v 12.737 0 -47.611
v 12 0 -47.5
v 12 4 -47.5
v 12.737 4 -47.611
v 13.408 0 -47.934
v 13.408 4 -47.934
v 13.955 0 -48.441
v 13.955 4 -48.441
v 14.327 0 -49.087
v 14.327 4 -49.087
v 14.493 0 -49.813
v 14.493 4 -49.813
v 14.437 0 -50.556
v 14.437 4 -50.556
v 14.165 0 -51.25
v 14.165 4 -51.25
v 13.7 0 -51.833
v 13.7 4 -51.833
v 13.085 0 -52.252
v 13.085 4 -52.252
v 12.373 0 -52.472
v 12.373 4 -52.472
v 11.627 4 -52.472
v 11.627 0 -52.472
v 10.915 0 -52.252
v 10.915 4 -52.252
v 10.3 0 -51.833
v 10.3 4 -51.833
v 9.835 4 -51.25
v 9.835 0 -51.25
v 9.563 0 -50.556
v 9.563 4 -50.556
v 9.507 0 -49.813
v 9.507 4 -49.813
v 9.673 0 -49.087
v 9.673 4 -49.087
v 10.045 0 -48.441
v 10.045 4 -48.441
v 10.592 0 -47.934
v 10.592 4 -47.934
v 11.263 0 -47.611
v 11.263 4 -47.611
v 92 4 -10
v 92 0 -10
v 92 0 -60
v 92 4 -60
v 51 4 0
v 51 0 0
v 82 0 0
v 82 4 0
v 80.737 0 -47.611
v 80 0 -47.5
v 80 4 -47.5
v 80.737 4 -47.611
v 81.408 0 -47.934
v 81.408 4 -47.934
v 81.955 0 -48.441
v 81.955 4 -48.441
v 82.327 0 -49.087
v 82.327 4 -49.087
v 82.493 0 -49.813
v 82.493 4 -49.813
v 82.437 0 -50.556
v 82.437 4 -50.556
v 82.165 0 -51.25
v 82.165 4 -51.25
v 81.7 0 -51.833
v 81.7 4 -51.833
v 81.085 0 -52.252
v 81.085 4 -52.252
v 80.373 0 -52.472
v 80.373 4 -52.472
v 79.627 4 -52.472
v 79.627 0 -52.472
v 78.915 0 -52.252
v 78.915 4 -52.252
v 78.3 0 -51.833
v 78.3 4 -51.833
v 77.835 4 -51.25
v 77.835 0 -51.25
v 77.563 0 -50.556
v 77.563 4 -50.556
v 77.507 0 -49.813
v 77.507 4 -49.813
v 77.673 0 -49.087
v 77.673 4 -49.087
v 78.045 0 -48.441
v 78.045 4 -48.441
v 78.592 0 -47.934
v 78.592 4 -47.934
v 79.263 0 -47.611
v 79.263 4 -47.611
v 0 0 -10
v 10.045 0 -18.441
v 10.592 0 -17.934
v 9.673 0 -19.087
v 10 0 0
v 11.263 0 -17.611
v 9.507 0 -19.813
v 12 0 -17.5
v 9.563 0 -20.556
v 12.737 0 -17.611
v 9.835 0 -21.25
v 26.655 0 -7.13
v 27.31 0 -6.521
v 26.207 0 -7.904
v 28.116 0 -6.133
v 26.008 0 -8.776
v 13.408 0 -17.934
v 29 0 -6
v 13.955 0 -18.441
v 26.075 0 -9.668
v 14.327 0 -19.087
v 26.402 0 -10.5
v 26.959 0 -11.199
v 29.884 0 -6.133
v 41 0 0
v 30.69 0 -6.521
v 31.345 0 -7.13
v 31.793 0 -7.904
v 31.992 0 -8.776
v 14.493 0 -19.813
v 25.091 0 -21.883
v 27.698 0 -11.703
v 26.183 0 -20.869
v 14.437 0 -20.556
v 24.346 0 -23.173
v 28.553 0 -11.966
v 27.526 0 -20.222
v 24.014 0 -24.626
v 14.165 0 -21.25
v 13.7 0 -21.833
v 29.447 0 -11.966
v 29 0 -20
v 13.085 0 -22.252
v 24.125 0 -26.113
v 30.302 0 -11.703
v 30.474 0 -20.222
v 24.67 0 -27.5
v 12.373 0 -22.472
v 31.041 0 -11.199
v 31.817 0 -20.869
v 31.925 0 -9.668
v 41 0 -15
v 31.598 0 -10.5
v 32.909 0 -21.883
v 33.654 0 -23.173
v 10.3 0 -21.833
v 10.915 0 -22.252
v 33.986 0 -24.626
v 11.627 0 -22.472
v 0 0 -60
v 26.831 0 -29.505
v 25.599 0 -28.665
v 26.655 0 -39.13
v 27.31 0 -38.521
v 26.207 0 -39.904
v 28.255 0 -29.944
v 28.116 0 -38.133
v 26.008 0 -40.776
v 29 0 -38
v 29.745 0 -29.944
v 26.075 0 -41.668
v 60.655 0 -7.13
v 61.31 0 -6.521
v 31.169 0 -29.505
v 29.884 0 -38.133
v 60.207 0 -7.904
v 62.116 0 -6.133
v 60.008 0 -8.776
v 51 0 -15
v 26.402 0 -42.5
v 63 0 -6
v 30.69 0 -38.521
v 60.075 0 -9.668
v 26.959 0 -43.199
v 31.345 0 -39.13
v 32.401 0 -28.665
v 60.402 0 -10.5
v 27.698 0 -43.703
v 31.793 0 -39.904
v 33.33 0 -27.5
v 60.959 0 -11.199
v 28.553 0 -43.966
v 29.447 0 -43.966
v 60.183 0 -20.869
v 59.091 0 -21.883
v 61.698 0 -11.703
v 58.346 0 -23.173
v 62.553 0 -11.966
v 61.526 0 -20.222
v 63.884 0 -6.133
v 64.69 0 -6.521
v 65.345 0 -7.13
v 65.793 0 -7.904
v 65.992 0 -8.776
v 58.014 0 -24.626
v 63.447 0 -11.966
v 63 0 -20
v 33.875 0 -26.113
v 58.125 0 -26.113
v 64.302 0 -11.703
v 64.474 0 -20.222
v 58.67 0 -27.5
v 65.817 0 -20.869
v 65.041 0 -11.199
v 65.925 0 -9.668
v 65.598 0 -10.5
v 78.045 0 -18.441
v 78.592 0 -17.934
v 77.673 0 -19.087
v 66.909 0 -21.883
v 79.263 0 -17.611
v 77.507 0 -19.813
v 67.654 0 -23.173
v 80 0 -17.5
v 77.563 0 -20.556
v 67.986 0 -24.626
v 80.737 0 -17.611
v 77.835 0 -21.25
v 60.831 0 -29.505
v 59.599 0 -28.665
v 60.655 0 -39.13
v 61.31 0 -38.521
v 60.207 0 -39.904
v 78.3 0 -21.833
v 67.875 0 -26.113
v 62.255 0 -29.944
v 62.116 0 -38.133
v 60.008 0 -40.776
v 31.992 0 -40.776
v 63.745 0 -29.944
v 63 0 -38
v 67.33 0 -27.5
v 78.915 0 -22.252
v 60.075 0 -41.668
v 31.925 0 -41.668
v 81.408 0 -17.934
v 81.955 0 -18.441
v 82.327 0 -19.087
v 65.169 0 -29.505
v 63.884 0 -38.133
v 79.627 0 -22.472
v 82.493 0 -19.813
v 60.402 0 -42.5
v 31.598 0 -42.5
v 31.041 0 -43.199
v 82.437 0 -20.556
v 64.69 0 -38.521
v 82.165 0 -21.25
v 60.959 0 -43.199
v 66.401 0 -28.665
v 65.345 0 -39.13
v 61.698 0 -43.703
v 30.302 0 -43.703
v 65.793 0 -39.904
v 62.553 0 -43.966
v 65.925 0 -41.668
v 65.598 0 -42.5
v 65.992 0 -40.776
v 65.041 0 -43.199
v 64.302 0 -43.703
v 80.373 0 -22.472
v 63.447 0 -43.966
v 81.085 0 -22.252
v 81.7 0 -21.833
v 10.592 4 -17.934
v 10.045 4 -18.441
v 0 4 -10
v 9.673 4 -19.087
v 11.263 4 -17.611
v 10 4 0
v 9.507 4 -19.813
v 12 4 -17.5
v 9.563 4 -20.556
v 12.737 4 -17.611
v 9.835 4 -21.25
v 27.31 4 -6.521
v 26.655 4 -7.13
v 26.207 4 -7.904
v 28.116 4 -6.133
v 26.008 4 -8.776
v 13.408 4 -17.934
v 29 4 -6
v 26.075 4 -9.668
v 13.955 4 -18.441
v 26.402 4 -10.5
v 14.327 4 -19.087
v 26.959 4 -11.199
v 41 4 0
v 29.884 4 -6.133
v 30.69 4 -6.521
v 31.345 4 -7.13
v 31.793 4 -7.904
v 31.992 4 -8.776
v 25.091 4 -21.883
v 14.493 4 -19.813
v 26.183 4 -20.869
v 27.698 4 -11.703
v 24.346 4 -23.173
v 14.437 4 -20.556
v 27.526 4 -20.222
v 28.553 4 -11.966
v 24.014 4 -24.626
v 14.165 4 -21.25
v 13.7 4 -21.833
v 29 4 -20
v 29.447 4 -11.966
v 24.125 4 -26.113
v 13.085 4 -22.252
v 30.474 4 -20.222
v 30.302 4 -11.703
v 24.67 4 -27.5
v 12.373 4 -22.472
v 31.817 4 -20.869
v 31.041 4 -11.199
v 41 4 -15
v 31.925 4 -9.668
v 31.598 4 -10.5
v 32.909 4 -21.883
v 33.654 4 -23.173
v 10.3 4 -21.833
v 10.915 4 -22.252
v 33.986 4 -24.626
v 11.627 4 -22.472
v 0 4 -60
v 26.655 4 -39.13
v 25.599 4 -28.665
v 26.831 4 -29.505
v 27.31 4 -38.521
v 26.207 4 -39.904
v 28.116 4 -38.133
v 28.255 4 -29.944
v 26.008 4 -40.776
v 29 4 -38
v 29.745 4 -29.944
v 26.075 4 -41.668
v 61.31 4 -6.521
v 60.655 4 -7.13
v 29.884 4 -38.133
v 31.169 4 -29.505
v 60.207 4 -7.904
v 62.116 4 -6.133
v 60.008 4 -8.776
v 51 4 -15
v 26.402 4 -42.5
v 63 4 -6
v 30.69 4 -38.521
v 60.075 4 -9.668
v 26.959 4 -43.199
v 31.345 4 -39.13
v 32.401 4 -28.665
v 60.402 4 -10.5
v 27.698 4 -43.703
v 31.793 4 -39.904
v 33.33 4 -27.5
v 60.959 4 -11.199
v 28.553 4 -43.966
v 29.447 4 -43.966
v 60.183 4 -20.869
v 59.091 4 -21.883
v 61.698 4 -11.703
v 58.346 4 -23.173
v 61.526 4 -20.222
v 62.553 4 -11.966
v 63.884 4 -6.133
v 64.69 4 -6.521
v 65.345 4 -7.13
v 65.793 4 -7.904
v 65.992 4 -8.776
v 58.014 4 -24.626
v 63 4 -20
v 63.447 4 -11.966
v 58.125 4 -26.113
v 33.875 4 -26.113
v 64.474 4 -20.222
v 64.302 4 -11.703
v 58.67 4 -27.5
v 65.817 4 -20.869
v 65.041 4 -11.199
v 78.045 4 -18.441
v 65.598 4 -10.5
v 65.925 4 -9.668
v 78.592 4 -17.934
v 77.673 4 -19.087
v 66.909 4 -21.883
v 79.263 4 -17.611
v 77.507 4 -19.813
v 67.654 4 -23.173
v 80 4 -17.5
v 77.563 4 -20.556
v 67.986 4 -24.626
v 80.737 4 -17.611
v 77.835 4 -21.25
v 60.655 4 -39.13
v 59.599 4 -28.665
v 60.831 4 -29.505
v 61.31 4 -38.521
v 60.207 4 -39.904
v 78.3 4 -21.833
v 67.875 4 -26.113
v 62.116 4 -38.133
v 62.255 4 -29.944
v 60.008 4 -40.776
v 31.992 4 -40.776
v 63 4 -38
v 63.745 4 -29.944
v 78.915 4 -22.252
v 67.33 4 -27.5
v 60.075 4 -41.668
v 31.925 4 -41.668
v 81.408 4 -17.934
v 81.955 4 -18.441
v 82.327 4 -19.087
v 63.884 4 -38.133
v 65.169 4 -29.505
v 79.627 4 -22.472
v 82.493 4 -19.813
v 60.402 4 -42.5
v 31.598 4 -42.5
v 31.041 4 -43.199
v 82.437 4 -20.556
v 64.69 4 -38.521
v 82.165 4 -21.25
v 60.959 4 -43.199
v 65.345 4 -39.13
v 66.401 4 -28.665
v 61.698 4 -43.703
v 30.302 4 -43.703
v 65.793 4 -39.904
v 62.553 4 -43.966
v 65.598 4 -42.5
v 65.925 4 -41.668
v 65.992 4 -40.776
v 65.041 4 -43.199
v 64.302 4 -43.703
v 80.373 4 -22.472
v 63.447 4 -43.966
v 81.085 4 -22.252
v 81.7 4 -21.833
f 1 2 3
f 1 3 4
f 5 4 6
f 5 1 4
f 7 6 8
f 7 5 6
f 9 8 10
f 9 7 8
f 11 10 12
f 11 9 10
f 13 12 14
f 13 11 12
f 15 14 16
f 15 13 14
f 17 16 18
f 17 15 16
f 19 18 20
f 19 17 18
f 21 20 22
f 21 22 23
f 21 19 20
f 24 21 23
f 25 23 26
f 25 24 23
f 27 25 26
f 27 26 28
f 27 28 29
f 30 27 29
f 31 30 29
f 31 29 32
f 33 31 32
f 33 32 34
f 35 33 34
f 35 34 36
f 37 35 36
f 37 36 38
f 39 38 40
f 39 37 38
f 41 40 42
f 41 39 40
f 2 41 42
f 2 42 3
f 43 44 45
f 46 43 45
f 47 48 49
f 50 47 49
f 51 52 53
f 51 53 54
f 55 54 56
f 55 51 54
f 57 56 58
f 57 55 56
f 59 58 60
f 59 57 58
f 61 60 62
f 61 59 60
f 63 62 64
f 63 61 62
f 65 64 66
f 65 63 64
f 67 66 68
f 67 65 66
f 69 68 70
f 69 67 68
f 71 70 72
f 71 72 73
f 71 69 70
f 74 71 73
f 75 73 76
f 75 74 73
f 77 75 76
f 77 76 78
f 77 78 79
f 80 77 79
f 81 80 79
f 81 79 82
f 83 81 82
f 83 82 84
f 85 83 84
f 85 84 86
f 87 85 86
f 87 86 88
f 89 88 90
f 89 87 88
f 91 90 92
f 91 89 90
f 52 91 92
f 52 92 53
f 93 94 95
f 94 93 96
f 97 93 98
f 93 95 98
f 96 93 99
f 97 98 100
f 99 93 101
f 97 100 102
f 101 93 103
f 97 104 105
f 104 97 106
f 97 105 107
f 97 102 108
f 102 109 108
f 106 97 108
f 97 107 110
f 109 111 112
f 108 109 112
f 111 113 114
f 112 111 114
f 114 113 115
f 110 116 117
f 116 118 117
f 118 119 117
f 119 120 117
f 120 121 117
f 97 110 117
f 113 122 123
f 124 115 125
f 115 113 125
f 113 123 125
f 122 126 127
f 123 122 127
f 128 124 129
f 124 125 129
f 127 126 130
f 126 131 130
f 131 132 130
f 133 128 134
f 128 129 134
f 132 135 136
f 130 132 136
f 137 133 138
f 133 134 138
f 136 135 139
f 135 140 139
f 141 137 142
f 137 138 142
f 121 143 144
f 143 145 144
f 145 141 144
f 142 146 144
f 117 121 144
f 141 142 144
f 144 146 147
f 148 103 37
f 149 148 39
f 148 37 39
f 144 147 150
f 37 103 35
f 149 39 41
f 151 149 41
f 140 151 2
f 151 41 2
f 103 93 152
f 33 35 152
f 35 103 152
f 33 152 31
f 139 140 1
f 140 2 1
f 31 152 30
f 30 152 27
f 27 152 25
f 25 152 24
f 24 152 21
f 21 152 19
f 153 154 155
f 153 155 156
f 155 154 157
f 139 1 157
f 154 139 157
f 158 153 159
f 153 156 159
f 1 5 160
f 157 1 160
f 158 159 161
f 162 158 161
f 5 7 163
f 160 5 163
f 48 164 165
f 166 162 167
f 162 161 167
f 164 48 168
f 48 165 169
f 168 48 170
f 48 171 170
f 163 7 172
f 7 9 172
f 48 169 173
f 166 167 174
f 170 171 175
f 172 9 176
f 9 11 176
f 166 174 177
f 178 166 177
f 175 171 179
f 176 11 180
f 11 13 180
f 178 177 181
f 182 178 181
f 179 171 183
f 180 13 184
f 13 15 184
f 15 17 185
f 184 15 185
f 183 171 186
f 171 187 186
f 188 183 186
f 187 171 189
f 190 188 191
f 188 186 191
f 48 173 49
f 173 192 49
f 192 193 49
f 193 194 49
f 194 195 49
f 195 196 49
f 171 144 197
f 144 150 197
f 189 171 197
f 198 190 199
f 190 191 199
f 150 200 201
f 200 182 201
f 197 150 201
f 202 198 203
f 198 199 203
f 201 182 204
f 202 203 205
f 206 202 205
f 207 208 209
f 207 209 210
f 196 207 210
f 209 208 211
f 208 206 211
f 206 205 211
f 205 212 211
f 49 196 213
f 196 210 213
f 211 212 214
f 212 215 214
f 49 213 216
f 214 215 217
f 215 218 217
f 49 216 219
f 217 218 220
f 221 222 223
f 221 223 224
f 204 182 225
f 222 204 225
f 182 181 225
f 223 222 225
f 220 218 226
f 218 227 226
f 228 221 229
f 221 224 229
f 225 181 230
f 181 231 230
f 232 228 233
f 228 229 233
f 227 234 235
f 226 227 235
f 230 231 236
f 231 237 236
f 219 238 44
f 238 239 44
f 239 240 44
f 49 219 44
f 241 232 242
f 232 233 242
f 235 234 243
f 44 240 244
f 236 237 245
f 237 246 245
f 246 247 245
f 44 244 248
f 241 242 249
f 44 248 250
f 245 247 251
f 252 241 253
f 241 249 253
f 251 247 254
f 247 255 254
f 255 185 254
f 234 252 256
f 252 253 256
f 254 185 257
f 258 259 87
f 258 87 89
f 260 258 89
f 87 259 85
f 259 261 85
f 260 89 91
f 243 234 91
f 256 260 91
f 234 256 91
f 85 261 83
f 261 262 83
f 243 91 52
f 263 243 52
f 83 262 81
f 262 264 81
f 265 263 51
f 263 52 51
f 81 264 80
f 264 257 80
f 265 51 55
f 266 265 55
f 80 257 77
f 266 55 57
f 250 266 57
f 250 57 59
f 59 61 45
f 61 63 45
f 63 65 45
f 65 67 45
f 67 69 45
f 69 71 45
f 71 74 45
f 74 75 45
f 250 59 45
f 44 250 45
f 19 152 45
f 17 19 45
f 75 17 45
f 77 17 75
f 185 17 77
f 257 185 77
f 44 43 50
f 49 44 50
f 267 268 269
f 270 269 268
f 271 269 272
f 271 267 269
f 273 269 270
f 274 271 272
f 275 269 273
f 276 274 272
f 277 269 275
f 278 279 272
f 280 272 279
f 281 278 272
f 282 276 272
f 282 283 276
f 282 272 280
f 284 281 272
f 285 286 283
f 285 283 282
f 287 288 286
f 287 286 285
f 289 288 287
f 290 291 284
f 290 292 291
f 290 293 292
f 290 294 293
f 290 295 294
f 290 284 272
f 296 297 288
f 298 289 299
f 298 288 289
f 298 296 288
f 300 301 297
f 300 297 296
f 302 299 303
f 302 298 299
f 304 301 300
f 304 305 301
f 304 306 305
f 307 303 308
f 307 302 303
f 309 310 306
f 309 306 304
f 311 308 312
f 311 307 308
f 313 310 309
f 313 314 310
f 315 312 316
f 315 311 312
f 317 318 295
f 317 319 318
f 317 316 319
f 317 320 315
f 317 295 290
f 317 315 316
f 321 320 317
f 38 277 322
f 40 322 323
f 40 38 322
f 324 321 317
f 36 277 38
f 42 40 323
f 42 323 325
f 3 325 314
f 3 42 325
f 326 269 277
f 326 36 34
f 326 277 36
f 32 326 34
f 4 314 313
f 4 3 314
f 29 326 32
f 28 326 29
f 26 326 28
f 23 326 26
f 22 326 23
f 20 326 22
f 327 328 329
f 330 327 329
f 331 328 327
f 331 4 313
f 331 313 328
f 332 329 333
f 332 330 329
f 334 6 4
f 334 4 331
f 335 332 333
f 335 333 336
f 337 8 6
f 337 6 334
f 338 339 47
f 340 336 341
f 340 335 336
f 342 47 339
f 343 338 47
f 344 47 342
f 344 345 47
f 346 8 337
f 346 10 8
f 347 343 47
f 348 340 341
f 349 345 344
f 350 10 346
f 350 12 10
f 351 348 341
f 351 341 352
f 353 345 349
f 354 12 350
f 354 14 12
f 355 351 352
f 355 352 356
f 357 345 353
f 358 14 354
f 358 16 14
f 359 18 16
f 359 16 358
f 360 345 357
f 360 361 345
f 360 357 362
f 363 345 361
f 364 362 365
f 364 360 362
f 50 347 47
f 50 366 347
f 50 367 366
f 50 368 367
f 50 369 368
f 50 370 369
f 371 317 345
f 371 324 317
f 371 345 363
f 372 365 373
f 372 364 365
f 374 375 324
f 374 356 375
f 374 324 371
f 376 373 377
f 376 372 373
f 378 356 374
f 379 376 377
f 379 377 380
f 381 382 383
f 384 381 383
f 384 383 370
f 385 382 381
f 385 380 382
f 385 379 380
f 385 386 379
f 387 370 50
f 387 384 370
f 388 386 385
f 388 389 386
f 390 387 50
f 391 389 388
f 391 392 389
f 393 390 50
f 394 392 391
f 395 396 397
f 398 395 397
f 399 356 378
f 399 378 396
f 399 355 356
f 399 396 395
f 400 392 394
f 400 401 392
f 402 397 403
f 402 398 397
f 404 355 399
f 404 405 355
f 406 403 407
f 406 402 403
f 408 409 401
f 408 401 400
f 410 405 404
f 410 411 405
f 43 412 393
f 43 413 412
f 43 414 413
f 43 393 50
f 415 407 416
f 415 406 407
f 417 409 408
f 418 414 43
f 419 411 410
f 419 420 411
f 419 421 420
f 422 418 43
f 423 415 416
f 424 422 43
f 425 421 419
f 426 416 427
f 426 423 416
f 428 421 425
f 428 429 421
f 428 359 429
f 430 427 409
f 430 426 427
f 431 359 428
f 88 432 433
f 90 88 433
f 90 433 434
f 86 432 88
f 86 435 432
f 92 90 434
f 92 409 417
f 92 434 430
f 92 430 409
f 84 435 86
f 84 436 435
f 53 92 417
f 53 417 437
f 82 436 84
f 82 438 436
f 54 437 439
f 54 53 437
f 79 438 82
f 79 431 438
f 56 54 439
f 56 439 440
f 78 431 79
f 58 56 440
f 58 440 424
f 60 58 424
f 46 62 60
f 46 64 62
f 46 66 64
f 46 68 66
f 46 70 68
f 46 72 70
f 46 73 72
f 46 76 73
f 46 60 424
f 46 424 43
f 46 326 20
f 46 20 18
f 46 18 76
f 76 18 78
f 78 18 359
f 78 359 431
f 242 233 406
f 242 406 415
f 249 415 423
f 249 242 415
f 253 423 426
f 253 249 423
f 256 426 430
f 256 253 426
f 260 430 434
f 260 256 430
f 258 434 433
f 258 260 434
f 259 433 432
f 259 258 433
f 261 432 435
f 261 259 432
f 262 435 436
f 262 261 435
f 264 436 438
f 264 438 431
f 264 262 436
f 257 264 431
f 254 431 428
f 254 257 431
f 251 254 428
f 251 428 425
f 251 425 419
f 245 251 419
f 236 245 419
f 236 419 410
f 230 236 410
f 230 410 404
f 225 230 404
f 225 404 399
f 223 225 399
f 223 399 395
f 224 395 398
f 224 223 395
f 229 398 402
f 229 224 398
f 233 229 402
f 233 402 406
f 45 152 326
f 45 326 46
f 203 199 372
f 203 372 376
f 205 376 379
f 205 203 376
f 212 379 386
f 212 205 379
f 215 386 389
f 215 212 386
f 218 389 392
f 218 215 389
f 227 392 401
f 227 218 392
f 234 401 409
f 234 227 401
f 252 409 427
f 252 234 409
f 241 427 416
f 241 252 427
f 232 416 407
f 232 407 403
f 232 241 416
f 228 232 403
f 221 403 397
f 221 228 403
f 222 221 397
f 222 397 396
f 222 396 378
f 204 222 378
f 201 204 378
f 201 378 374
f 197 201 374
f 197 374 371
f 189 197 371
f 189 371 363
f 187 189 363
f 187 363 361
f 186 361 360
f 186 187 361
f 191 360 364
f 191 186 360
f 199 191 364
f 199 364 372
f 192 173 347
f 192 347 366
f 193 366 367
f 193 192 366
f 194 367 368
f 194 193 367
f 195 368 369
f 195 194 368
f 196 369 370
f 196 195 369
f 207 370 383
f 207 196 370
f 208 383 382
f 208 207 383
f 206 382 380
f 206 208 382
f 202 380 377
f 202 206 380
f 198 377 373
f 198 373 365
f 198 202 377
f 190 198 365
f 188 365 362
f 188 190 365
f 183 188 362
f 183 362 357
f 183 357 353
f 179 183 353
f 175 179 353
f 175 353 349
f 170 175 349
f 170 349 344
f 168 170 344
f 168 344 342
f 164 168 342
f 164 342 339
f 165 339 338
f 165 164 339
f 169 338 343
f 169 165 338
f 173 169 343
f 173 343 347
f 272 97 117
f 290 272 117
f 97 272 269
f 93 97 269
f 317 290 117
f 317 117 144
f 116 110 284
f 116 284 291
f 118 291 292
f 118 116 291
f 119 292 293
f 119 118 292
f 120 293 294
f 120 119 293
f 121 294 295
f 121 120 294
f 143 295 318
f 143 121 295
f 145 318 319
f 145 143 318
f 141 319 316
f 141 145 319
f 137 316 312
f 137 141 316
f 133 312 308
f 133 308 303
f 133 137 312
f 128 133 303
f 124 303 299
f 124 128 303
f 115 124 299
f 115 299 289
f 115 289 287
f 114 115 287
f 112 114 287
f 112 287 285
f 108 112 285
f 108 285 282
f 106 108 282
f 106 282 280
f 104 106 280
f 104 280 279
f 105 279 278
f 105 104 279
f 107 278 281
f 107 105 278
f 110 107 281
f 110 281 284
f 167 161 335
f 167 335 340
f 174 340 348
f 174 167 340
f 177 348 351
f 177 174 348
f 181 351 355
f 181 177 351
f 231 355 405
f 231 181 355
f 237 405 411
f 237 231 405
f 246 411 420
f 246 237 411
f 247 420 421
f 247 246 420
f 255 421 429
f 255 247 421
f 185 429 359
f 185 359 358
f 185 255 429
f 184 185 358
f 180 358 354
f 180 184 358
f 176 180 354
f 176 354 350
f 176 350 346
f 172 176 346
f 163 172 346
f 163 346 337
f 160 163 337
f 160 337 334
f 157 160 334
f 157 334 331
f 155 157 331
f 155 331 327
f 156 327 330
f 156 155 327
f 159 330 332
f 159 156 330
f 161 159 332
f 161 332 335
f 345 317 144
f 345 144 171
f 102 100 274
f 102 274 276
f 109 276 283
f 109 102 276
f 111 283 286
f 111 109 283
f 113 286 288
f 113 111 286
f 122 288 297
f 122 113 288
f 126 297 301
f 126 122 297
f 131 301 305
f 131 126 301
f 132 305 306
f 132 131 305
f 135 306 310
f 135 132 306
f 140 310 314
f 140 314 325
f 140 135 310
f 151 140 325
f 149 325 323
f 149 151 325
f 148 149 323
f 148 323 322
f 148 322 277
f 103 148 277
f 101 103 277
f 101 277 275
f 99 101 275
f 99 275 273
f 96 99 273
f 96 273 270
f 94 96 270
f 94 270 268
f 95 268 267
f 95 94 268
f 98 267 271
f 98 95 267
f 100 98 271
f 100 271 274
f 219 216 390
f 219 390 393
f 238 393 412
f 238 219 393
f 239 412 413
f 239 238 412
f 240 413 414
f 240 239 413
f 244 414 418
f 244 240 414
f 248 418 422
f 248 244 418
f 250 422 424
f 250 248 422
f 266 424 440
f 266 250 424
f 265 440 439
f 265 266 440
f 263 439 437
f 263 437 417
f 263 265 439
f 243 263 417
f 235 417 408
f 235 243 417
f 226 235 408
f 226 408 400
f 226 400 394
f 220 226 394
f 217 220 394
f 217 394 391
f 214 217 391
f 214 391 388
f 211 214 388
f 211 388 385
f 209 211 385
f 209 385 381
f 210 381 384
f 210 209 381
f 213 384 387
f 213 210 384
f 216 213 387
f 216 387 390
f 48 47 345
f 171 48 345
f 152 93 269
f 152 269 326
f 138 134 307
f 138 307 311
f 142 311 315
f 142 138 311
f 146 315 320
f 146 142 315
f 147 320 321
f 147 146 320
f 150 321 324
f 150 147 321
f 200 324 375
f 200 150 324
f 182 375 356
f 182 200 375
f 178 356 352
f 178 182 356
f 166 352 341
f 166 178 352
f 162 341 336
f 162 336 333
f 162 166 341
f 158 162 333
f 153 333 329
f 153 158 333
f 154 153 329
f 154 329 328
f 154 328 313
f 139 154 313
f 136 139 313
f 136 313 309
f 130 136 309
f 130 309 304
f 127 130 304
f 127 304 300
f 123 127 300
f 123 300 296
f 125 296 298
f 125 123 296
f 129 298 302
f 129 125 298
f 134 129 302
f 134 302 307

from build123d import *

# Parameters (mm, degrees)
SKETCH_1_W          = 92
SKETCH_1_H          = 60
SKETCH_1_R          = 2.5
SKETCH_1_R_2        = 5
SKETCH_1_R_3        = 3
EXTRUDE_1_DEPTH     = 4
SKETCH_2_W          = 10
SKETCH_2_H          = 15
CUT_EXTRUDE_1_DEPTH = 10
CUT_EXTRUDE_2_DEPTH = 4


with BuildPart() as part:
    # Эскиз1 → Бобышка-Вытянуть1 (new body)
    with BuildSketch(Plane(origin=(0, 0, 0), x_dir=(1, 0, 0), z_dir=(0, 1, 0))):
        with Locations((46, 30)):
            Rectangle(SKETCH_1_W, SKETCH_1_H)
        with Locations(Location((12, 50, 0), (0, 0, 270))):
            Circle(SKETCH_1_R, mode=Mode.SUBTRACT)
        with Locations(Location((12, 20, 0), (0, 0, 270))):
            Circle(SKETCH_1_R, mode=Mode.SUBTRACT)
        with Locations(Location((80, 50, 0), (0, 0, 270))):
            Circle(SKETCH_1_R, mode=Mode.SUBTRACT)
        with Locations(Location((80, 20, 0), (0, 0, 270))):
            Circle(SKETCH_1_R, mode=Mode.SUBTRACT)
        with Locations(Location((29, 25, 0), (0, 0, 270))):
            Circle(SKETCH_1_R_2, mode=Mode.SUBTRACT)
        with Locations(Location((63, 25, 0), (0, 0, 270))):
            Circle(SKETCH_1_R_2, mode=Mode.SUBTRACT)
        with Locations(Location((29, 41, 0), (0, 0, 270))):
            Circle(SKETCH_1_R_3, mode=Mode.SUBTRACT)
        with Locations(Location((29, 9, 0), (0, 0, 270))):
            Circle(SKETCH_1_R_3, mode=Mode.SUBTRACT)
        with Locations(Location((63, 41, 0), (0, 0, 270))):
            Circle(SKETCH_1_R_3, mode=Mode.SUBTRACT)
        with Locations(Location((63, 9, 0), (0, 0, 270))):
            Circle(SKETCH_1_R_3, mode=Mode.SUBTRACT)
    extrude(amount=EXTRUDE_1_DEPTH)

    # Эскиз2 → Вырез-Вытянуть1 (cut)
    with BuildSketch(Plane(origin=(0, 4, 0), x_dir=(1, 0, 0), z_dir=(0, 1, 0))):
        with Locations((46, 7.5)):
            Rectangle(SKETCH_2_W, SKETCH_2_H)
    extrude(amount=-CUT_EXTRUDE_1_DEPTH, mode=Mode.SUBTRACT)

    # Эскиз3 → Вырез-Вытянуть2 (cut)
    with BuildSketch(Plane(origin=(0, 4, 0), x_dir=(1, 0, 0), z_dir=(0, 1, 0))):
        Polygon((10, 0), (0, 10), (0, 0), align=None)
        Polygon((92, 0), (92, 10), (82, 0), align=None)
    extrude(amount=-CUT_EXTRUDE_2_DEPTH, mode=Mode.SUBTRACT)


solid = part.part
